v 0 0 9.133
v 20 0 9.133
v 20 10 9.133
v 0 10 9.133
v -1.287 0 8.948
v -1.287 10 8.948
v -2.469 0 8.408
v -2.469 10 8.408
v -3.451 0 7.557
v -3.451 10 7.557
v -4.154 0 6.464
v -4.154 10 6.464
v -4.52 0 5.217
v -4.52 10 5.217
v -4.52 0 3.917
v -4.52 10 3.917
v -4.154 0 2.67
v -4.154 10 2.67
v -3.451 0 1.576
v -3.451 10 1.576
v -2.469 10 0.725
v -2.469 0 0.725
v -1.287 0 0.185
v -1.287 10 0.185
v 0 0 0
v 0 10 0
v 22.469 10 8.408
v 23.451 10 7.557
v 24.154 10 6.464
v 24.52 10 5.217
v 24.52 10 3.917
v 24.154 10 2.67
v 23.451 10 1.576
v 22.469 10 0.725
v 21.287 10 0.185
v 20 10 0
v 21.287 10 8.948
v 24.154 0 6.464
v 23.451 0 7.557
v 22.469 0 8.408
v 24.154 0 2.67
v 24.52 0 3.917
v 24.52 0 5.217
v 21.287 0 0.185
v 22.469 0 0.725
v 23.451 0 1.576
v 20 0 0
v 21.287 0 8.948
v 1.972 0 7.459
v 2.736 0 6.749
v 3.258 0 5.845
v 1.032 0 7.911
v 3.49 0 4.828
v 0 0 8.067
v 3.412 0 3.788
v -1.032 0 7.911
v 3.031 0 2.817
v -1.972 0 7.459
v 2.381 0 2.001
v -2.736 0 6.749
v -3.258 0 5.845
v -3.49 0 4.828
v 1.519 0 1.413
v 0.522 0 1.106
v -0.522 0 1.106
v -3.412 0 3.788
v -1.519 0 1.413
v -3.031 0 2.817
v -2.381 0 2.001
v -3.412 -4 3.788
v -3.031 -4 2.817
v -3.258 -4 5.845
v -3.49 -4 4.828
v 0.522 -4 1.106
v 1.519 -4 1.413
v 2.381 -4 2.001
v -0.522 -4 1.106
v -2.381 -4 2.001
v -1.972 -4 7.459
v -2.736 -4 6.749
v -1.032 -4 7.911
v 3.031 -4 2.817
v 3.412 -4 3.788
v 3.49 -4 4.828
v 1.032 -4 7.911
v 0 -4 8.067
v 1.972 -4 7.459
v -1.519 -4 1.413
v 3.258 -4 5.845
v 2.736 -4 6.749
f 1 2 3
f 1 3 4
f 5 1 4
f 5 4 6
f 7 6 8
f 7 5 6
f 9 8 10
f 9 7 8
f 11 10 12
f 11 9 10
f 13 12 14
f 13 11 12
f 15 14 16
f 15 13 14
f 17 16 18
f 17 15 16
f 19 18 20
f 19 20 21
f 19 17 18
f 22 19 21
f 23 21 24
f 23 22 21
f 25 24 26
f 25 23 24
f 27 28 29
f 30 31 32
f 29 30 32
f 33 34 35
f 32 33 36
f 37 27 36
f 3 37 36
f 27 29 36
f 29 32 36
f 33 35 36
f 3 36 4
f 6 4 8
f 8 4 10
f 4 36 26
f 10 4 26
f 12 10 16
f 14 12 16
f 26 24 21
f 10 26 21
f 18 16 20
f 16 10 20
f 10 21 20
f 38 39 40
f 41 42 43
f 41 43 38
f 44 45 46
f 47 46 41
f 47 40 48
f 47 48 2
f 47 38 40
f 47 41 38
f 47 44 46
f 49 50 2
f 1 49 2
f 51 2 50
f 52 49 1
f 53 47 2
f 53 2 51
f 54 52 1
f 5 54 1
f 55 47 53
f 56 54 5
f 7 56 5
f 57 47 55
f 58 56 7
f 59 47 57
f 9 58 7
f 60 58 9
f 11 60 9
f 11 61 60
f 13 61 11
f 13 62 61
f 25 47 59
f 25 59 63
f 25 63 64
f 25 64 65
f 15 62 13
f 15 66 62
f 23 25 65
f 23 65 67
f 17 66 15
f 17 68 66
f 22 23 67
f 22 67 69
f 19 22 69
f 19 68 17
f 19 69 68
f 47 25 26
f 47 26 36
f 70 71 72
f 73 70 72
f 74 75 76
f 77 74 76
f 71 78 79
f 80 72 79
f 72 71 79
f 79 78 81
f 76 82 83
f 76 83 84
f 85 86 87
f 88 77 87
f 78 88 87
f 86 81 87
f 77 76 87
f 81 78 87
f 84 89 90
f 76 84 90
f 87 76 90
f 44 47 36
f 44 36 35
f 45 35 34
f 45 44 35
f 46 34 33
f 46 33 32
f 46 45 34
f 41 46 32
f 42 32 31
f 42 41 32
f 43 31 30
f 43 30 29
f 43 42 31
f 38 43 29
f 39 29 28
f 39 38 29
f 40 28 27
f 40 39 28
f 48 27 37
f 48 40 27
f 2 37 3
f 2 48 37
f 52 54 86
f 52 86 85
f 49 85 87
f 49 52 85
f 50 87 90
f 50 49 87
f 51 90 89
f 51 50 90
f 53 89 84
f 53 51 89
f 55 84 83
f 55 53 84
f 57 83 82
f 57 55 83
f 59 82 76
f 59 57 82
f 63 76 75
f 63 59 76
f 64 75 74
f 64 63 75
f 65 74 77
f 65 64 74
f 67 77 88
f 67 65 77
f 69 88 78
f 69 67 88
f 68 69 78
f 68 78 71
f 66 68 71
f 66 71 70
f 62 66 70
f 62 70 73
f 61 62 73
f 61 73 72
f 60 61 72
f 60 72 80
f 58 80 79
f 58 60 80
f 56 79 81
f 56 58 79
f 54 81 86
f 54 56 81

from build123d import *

# Parameters (mm, degrees)
RESSALTO_EXTRUS_O1_DEPTH = 10
ESBO_O2_R                = 3.5
RESSALTO_EXTRUS_O2_DEPTH = 4


with BuildPart() as part:
    # Esboço1 → Ressalto-extrusão1 (new body)
    with BuildSketch(Plane(origin=(0, 0, 0), x_dir=(1, 0, 0), z_dir=(0, 1, 0))):
        with BuildLine():
            Line((0, 0), (20, 0))
            ThreePointArc((20, 0), (24.566666667, -4.566666667), (20, -9.133333333))
            Line((20, -9.133333333), (0, -9.133333333))
            ThreePointArc((0, -9.133333333), (-4.566666667, -4.566666667), (0, 0))
        make_face()
    extrude(amount=RESSALTO_EXTRUS_O1_DEPTH)

    # Esboço2 → Ressalto-extrusão2 (add)
    with BuildSketch(Plane(origin=(0, 0, 0), x_dir=(1, 0, 0), z_dir=(0, 1, 0))):
        with Locations(Location((0, -4.566666667, 0), (0, 0, 270))):
            Circle(ESBO_O2_R)
    extrude(amount=-RESSALTO_EXTRUS_O2_DEPTH)


solid = part.part
